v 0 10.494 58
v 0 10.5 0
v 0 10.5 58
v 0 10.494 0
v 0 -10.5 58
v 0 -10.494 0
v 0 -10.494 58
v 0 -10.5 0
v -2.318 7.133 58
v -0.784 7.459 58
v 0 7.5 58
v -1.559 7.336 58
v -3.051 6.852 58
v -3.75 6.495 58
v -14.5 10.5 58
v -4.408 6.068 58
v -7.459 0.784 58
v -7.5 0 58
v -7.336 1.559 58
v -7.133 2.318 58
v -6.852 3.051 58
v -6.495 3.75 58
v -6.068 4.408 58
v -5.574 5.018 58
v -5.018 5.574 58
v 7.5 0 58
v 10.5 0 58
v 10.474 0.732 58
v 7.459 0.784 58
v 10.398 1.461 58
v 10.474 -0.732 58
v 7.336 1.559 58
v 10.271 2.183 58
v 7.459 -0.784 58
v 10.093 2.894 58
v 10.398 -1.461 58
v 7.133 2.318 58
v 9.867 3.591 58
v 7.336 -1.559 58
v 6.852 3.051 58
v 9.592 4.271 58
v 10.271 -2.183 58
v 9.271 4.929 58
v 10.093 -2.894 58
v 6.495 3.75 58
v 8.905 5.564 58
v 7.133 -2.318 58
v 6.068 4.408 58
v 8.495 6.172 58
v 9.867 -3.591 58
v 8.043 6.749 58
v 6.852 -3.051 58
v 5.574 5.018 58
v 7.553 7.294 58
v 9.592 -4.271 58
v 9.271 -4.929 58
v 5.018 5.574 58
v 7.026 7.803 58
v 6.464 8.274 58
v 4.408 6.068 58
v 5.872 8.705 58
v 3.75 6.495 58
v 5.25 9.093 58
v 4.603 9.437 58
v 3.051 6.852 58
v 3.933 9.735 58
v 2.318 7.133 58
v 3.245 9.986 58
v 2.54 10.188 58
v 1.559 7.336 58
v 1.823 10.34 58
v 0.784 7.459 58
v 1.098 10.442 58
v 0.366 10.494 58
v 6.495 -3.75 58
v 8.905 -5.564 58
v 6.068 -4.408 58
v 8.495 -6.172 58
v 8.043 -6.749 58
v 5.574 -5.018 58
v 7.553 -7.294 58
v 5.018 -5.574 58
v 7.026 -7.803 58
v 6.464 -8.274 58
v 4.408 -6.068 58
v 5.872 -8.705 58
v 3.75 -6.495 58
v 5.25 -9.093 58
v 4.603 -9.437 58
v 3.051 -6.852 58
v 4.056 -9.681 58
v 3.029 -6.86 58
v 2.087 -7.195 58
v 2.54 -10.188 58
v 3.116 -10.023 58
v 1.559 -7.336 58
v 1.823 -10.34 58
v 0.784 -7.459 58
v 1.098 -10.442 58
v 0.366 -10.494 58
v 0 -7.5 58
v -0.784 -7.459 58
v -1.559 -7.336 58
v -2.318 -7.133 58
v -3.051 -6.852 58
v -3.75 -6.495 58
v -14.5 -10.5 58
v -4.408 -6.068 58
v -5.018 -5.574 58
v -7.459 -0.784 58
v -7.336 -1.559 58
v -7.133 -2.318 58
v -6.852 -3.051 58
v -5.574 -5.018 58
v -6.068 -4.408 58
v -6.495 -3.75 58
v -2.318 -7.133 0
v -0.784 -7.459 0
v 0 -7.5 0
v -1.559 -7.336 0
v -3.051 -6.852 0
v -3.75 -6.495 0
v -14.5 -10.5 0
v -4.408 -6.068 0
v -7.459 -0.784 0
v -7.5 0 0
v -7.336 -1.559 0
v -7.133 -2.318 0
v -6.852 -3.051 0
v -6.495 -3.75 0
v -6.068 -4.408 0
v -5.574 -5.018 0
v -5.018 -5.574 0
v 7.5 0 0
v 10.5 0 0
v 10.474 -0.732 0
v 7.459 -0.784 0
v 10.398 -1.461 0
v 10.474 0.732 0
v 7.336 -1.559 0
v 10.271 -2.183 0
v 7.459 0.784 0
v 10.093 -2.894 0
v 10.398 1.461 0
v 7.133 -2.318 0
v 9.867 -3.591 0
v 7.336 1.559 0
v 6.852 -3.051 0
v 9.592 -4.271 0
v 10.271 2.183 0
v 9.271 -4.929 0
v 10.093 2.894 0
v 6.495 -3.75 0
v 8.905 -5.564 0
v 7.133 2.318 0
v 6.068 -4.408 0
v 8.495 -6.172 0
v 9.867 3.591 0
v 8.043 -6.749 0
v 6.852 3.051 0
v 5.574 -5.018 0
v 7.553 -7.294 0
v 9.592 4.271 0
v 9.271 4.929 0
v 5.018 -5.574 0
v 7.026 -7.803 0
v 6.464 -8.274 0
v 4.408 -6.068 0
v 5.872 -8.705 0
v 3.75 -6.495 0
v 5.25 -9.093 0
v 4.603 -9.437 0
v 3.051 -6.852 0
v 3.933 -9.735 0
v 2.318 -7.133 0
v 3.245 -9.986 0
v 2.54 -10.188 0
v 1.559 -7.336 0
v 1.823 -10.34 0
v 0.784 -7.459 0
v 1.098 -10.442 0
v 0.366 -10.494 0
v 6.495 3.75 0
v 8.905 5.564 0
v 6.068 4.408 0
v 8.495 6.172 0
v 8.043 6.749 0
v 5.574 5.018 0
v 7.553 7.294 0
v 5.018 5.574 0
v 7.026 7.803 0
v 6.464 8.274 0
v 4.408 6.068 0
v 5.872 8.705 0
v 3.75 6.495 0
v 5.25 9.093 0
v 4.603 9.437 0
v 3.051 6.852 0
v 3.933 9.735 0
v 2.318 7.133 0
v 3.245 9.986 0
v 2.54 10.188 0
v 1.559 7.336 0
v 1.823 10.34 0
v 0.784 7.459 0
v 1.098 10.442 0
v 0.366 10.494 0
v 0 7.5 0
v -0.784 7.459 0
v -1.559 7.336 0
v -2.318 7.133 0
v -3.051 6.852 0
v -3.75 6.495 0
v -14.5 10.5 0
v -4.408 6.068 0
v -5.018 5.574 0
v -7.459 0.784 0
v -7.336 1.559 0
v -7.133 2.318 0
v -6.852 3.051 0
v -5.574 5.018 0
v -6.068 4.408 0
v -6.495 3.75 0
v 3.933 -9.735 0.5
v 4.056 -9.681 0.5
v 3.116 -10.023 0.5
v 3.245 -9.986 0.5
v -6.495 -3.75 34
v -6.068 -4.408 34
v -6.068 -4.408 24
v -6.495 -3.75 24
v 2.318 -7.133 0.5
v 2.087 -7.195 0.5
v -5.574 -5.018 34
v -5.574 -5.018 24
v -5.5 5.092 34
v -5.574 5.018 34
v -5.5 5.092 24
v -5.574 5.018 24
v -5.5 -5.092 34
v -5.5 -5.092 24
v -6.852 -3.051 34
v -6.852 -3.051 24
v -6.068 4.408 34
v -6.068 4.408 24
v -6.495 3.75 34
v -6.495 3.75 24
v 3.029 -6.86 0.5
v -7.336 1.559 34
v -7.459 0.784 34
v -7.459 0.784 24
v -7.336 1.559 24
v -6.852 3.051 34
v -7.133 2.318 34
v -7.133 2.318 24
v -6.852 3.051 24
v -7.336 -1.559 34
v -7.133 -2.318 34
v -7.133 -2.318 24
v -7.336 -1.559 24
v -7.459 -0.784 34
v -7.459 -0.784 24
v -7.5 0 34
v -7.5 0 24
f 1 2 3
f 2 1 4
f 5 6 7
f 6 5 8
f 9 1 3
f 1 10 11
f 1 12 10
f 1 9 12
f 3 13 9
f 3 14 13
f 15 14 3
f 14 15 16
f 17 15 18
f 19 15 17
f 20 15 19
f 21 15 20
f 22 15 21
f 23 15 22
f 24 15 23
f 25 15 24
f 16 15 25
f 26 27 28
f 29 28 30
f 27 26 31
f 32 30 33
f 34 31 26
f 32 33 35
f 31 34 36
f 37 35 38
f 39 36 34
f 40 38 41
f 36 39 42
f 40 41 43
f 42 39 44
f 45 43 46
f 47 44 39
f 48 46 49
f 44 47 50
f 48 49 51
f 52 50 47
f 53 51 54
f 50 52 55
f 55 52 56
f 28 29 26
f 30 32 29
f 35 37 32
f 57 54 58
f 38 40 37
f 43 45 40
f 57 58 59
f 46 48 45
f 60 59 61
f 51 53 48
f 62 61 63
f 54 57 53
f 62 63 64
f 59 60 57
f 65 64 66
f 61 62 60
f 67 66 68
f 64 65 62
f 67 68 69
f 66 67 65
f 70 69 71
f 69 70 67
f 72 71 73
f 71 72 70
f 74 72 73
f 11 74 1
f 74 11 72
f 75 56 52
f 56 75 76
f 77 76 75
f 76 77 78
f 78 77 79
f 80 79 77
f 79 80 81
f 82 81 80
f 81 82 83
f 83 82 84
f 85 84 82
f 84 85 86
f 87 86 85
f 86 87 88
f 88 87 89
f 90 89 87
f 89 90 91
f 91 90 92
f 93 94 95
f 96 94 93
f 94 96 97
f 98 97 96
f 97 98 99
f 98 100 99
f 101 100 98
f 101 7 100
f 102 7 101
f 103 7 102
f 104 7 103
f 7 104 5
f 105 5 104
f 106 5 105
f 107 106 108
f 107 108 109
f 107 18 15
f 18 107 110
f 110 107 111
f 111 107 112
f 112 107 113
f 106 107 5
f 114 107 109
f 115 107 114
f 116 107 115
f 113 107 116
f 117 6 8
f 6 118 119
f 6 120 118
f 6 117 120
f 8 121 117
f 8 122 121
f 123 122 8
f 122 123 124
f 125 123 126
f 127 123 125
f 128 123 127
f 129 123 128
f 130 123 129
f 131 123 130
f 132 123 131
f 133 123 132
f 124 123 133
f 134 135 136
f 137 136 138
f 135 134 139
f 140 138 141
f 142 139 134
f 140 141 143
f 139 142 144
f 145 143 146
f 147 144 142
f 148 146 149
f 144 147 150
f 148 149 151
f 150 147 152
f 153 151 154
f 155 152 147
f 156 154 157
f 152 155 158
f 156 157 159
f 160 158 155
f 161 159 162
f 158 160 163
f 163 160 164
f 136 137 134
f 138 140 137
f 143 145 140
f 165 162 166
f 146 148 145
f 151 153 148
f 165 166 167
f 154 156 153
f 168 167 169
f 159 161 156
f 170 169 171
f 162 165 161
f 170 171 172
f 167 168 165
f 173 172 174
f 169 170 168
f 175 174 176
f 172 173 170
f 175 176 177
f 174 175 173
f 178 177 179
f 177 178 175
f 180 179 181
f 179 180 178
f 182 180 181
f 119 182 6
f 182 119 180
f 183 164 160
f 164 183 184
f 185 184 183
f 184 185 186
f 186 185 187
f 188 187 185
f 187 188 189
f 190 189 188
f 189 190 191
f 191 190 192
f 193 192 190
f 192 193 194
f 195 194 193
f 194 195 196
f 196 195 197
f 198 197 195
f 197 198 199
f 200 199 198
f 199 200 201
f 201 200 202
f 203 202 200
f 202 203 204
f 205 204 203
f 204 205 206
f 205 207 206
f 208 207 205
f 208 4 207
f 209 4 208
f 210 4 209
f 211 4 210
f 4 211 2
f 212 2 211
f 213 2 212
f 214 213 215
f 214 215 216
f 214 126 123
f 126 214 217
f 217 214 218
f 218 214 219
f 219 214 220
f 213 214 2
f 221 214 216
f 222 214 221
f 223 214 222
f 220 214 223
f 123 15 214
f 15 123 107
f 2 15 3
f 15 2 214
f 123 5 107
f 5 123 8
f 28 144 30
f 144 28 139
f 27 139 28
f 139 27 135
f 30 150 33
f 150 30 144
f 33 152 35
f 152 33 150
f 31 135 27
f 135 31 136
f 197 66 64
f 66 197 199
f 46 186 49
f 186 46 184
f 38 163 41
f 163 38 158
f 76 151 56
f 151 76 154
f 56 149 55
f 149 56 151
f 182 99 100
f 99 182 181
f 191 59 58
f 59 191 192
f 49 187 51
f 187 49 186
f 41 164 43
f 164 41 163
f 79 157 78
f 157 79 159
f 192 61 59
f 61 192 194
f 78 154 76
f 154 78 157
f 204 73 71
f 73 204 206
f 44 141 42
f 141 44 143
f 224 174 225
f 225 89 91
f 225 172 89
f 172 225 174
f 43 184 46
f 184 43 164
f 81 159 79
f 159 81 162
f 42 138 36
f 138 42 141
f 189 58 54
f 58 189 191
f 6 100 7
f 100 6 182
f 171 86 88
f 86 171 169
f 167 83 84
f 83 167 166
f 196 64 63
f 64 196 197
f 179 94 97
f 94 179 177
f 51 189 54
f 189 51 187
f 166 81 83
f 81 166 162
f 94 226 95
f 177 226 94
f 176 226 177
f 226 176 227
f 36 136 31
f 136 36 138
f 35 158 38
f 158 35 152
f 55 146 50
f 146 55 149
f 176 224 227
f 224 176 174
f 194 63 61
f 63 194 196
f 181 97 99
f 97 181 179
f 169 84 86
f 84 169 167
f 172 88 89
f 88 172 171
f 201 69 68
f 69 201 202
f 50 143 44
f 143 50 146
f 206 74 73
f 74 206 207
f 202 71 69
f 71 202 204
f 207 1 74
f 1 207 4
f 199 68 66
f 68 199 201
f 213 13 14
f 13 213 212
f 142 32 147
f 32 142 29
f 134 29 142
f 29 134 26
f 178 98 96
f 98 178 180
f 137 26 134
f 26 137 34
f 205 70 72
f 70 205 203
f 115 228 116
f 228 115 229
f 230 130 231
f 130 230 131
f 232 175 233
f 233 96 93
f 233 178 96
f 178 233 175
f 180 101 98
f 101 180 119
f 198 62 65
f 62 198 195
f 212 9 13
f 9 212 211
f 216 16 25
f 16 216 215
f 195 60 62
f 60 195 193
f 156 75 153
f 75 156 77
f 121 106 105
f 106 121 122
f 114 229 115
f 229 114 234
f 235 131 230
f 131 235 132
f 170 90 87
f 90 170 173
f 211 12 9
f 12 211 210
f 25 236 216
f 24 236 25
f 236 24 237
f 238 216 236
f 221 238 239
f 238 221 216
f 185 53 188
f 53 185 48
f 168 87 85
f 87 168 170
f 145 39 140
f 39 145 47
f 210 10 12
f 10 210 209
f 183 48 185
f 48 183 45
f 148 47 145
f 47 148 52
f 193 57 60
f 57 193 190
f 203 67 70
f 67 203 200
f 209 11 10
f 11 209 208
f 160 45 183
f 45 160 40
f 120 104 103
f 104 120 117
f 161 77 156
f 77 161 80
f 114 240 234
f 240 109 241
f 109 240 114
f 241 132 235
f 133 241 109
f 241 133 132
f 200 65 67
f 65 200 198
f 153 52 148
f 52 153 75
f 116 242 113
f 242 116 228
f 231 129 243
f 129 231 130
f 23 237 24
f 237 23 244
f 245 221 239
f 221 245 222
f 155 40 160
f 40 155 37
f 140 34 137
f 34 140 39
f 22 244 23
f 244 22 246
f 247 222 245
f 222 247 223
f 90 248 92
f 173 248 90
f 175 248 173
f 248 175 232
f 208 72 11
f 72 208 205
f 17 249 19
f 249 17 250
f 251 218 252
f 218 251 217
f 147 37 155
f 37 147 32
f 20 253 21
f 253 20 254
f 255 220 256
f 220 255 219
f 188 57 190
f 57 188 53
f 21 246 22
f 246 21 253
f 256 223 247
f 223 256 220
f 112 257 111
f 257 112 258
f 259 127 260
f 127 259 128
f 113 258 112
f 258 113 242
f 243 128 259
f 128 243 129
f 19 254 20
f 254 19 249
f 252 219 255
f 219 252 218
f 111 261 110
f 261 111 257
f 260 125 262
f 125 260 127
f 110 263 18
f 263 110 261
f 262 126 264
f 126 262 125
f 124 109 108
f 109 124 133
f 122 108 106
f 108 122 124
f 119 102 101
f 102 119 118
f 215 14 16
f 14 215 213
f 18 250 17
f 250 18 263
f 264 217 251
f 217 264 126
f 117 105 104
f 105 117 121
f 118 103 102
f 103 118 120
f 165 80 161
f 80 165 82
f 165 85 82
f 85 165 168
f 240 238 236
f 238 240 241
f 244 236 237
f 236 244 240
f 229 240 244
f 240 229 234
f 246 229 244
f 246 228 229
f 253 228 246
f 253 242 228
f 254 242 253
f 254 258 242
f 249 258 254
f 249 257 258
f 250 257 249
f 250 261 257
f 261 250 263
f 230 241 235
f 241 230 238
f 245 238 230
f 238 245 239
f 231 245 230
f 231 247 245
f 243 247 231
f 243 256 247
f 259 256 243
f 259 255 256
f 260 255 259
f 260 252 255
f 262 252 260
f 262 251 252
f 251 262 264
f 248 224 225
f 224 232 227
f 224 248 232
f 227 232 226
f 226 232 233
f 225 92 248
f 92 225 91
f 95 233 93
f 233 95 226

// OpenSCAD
// PRUSA iteration3
// Bearing holders
// GNU GPL v3
// Josef Průša <iam@josefprusa.cz> and contributors
// http://www.reprap.org/wiki/Prusa_Mendel
// http://prusamendel.org

bearing_diameter = 15;

module horizontal_bearing_base(bearings=1) {
  translate(v=[0,0,6]) cube(size = [24,8+bearings*25,12], center = true);
}

module horizontal_bearing_holes(bearings=1) {
  cutter_lenght = 10+bearings*25;
  one_holder_lenght = 8+25;
  holder_lenght = 8+bearings*25;

  // Main bearing cut
  difference() {
    translate(v = [0,0,12]) rotate(a = [90,0,0]) translate(v = [0,0,-cutter_lenght/2]) cylinder(h = cutter_lenght, r = bearing_diameter/2, $fn = 50);
    // Bearing retainers
    translate(v=[0,1-holder_lenght/2,3]) cube(size = [24,6,8], center = true);
    translate(v=[0,-1+holder_lenght/2,3]) cube(size = [24,6,8], center = true);
  }

  // Ziptie cutouts
  ziptie_cut_ofset = 0;

  for (i = [0:bearings-1]) {
    // For easier positioning I move them by half of one
    // bearing holder then add each bearign lenght and then center again
    translate(v = [0,-holder_lenght/2,0]) translate(v = [0,one_holder_lenght/2+i*25,0]) difference(){
      union(){
        translate(v = [0,2-6,12]) rotate(a = [90,0,0]) translate(v = [0,0,0]) cylinder(h = 4, r = 12.5, $fn = 50);
        translate(v = [0,2+6,12]) rotate(a = [90,0,0]) translate(v = [0,0,0]) cylinder(h = 4, r = 12.5, $fn = 50);
      }
      translate(v = [0,10,12]) rotate(a = [90,0,0]) translate(v = [0,0,0]) cylinder(h = 24, r = 10, $fn = 50);
    }
  }
}

module horizontal_bearing_test() {
  difference(){
    horizontal_bearing_base(1);
    horizontal_bearing_holes(1);
  }
  translate(v=[30,0,0]) difference(){
    horizontal_bearing_base(2);
    horizontal_bearing_holes(2);
  }
  translate(v=[60,0,0]) difference(){
    horizontal_bearing_base(3);
    horizontal_bearing_holes(3);
  }
}

thinwall = 3;
bearing_size = bearing_diameter + 2 * thinwall;

module vertical_bearing_base(height) {
  translate(v = [-2-bearing_size/4,0,height/2]) cube(size = [4+bearing_size/2,bearing_size,height], center = true);
  cylinder(h = height, r=bearing_size/2, $fn = 90);
}

module vertical_bearing_holes(height) {
  difference() {
    translate(v = [0,0,-1]) cylinder(h = height+2, r = bearing_diameter/2, $fn = 60);
    translate(v = [-bearing_diameter/2,0,height/2]) cube([4,bearing_diameter+2,10], center = true);
  }
  rotate(a = [0,0,-70]) translate(v = [8,0,31.5]) cube(size = [5,1,62], center = true);
}

difference() {
  vertical_bearing_base(58);
  vertical_bearing_holes(58);
}
